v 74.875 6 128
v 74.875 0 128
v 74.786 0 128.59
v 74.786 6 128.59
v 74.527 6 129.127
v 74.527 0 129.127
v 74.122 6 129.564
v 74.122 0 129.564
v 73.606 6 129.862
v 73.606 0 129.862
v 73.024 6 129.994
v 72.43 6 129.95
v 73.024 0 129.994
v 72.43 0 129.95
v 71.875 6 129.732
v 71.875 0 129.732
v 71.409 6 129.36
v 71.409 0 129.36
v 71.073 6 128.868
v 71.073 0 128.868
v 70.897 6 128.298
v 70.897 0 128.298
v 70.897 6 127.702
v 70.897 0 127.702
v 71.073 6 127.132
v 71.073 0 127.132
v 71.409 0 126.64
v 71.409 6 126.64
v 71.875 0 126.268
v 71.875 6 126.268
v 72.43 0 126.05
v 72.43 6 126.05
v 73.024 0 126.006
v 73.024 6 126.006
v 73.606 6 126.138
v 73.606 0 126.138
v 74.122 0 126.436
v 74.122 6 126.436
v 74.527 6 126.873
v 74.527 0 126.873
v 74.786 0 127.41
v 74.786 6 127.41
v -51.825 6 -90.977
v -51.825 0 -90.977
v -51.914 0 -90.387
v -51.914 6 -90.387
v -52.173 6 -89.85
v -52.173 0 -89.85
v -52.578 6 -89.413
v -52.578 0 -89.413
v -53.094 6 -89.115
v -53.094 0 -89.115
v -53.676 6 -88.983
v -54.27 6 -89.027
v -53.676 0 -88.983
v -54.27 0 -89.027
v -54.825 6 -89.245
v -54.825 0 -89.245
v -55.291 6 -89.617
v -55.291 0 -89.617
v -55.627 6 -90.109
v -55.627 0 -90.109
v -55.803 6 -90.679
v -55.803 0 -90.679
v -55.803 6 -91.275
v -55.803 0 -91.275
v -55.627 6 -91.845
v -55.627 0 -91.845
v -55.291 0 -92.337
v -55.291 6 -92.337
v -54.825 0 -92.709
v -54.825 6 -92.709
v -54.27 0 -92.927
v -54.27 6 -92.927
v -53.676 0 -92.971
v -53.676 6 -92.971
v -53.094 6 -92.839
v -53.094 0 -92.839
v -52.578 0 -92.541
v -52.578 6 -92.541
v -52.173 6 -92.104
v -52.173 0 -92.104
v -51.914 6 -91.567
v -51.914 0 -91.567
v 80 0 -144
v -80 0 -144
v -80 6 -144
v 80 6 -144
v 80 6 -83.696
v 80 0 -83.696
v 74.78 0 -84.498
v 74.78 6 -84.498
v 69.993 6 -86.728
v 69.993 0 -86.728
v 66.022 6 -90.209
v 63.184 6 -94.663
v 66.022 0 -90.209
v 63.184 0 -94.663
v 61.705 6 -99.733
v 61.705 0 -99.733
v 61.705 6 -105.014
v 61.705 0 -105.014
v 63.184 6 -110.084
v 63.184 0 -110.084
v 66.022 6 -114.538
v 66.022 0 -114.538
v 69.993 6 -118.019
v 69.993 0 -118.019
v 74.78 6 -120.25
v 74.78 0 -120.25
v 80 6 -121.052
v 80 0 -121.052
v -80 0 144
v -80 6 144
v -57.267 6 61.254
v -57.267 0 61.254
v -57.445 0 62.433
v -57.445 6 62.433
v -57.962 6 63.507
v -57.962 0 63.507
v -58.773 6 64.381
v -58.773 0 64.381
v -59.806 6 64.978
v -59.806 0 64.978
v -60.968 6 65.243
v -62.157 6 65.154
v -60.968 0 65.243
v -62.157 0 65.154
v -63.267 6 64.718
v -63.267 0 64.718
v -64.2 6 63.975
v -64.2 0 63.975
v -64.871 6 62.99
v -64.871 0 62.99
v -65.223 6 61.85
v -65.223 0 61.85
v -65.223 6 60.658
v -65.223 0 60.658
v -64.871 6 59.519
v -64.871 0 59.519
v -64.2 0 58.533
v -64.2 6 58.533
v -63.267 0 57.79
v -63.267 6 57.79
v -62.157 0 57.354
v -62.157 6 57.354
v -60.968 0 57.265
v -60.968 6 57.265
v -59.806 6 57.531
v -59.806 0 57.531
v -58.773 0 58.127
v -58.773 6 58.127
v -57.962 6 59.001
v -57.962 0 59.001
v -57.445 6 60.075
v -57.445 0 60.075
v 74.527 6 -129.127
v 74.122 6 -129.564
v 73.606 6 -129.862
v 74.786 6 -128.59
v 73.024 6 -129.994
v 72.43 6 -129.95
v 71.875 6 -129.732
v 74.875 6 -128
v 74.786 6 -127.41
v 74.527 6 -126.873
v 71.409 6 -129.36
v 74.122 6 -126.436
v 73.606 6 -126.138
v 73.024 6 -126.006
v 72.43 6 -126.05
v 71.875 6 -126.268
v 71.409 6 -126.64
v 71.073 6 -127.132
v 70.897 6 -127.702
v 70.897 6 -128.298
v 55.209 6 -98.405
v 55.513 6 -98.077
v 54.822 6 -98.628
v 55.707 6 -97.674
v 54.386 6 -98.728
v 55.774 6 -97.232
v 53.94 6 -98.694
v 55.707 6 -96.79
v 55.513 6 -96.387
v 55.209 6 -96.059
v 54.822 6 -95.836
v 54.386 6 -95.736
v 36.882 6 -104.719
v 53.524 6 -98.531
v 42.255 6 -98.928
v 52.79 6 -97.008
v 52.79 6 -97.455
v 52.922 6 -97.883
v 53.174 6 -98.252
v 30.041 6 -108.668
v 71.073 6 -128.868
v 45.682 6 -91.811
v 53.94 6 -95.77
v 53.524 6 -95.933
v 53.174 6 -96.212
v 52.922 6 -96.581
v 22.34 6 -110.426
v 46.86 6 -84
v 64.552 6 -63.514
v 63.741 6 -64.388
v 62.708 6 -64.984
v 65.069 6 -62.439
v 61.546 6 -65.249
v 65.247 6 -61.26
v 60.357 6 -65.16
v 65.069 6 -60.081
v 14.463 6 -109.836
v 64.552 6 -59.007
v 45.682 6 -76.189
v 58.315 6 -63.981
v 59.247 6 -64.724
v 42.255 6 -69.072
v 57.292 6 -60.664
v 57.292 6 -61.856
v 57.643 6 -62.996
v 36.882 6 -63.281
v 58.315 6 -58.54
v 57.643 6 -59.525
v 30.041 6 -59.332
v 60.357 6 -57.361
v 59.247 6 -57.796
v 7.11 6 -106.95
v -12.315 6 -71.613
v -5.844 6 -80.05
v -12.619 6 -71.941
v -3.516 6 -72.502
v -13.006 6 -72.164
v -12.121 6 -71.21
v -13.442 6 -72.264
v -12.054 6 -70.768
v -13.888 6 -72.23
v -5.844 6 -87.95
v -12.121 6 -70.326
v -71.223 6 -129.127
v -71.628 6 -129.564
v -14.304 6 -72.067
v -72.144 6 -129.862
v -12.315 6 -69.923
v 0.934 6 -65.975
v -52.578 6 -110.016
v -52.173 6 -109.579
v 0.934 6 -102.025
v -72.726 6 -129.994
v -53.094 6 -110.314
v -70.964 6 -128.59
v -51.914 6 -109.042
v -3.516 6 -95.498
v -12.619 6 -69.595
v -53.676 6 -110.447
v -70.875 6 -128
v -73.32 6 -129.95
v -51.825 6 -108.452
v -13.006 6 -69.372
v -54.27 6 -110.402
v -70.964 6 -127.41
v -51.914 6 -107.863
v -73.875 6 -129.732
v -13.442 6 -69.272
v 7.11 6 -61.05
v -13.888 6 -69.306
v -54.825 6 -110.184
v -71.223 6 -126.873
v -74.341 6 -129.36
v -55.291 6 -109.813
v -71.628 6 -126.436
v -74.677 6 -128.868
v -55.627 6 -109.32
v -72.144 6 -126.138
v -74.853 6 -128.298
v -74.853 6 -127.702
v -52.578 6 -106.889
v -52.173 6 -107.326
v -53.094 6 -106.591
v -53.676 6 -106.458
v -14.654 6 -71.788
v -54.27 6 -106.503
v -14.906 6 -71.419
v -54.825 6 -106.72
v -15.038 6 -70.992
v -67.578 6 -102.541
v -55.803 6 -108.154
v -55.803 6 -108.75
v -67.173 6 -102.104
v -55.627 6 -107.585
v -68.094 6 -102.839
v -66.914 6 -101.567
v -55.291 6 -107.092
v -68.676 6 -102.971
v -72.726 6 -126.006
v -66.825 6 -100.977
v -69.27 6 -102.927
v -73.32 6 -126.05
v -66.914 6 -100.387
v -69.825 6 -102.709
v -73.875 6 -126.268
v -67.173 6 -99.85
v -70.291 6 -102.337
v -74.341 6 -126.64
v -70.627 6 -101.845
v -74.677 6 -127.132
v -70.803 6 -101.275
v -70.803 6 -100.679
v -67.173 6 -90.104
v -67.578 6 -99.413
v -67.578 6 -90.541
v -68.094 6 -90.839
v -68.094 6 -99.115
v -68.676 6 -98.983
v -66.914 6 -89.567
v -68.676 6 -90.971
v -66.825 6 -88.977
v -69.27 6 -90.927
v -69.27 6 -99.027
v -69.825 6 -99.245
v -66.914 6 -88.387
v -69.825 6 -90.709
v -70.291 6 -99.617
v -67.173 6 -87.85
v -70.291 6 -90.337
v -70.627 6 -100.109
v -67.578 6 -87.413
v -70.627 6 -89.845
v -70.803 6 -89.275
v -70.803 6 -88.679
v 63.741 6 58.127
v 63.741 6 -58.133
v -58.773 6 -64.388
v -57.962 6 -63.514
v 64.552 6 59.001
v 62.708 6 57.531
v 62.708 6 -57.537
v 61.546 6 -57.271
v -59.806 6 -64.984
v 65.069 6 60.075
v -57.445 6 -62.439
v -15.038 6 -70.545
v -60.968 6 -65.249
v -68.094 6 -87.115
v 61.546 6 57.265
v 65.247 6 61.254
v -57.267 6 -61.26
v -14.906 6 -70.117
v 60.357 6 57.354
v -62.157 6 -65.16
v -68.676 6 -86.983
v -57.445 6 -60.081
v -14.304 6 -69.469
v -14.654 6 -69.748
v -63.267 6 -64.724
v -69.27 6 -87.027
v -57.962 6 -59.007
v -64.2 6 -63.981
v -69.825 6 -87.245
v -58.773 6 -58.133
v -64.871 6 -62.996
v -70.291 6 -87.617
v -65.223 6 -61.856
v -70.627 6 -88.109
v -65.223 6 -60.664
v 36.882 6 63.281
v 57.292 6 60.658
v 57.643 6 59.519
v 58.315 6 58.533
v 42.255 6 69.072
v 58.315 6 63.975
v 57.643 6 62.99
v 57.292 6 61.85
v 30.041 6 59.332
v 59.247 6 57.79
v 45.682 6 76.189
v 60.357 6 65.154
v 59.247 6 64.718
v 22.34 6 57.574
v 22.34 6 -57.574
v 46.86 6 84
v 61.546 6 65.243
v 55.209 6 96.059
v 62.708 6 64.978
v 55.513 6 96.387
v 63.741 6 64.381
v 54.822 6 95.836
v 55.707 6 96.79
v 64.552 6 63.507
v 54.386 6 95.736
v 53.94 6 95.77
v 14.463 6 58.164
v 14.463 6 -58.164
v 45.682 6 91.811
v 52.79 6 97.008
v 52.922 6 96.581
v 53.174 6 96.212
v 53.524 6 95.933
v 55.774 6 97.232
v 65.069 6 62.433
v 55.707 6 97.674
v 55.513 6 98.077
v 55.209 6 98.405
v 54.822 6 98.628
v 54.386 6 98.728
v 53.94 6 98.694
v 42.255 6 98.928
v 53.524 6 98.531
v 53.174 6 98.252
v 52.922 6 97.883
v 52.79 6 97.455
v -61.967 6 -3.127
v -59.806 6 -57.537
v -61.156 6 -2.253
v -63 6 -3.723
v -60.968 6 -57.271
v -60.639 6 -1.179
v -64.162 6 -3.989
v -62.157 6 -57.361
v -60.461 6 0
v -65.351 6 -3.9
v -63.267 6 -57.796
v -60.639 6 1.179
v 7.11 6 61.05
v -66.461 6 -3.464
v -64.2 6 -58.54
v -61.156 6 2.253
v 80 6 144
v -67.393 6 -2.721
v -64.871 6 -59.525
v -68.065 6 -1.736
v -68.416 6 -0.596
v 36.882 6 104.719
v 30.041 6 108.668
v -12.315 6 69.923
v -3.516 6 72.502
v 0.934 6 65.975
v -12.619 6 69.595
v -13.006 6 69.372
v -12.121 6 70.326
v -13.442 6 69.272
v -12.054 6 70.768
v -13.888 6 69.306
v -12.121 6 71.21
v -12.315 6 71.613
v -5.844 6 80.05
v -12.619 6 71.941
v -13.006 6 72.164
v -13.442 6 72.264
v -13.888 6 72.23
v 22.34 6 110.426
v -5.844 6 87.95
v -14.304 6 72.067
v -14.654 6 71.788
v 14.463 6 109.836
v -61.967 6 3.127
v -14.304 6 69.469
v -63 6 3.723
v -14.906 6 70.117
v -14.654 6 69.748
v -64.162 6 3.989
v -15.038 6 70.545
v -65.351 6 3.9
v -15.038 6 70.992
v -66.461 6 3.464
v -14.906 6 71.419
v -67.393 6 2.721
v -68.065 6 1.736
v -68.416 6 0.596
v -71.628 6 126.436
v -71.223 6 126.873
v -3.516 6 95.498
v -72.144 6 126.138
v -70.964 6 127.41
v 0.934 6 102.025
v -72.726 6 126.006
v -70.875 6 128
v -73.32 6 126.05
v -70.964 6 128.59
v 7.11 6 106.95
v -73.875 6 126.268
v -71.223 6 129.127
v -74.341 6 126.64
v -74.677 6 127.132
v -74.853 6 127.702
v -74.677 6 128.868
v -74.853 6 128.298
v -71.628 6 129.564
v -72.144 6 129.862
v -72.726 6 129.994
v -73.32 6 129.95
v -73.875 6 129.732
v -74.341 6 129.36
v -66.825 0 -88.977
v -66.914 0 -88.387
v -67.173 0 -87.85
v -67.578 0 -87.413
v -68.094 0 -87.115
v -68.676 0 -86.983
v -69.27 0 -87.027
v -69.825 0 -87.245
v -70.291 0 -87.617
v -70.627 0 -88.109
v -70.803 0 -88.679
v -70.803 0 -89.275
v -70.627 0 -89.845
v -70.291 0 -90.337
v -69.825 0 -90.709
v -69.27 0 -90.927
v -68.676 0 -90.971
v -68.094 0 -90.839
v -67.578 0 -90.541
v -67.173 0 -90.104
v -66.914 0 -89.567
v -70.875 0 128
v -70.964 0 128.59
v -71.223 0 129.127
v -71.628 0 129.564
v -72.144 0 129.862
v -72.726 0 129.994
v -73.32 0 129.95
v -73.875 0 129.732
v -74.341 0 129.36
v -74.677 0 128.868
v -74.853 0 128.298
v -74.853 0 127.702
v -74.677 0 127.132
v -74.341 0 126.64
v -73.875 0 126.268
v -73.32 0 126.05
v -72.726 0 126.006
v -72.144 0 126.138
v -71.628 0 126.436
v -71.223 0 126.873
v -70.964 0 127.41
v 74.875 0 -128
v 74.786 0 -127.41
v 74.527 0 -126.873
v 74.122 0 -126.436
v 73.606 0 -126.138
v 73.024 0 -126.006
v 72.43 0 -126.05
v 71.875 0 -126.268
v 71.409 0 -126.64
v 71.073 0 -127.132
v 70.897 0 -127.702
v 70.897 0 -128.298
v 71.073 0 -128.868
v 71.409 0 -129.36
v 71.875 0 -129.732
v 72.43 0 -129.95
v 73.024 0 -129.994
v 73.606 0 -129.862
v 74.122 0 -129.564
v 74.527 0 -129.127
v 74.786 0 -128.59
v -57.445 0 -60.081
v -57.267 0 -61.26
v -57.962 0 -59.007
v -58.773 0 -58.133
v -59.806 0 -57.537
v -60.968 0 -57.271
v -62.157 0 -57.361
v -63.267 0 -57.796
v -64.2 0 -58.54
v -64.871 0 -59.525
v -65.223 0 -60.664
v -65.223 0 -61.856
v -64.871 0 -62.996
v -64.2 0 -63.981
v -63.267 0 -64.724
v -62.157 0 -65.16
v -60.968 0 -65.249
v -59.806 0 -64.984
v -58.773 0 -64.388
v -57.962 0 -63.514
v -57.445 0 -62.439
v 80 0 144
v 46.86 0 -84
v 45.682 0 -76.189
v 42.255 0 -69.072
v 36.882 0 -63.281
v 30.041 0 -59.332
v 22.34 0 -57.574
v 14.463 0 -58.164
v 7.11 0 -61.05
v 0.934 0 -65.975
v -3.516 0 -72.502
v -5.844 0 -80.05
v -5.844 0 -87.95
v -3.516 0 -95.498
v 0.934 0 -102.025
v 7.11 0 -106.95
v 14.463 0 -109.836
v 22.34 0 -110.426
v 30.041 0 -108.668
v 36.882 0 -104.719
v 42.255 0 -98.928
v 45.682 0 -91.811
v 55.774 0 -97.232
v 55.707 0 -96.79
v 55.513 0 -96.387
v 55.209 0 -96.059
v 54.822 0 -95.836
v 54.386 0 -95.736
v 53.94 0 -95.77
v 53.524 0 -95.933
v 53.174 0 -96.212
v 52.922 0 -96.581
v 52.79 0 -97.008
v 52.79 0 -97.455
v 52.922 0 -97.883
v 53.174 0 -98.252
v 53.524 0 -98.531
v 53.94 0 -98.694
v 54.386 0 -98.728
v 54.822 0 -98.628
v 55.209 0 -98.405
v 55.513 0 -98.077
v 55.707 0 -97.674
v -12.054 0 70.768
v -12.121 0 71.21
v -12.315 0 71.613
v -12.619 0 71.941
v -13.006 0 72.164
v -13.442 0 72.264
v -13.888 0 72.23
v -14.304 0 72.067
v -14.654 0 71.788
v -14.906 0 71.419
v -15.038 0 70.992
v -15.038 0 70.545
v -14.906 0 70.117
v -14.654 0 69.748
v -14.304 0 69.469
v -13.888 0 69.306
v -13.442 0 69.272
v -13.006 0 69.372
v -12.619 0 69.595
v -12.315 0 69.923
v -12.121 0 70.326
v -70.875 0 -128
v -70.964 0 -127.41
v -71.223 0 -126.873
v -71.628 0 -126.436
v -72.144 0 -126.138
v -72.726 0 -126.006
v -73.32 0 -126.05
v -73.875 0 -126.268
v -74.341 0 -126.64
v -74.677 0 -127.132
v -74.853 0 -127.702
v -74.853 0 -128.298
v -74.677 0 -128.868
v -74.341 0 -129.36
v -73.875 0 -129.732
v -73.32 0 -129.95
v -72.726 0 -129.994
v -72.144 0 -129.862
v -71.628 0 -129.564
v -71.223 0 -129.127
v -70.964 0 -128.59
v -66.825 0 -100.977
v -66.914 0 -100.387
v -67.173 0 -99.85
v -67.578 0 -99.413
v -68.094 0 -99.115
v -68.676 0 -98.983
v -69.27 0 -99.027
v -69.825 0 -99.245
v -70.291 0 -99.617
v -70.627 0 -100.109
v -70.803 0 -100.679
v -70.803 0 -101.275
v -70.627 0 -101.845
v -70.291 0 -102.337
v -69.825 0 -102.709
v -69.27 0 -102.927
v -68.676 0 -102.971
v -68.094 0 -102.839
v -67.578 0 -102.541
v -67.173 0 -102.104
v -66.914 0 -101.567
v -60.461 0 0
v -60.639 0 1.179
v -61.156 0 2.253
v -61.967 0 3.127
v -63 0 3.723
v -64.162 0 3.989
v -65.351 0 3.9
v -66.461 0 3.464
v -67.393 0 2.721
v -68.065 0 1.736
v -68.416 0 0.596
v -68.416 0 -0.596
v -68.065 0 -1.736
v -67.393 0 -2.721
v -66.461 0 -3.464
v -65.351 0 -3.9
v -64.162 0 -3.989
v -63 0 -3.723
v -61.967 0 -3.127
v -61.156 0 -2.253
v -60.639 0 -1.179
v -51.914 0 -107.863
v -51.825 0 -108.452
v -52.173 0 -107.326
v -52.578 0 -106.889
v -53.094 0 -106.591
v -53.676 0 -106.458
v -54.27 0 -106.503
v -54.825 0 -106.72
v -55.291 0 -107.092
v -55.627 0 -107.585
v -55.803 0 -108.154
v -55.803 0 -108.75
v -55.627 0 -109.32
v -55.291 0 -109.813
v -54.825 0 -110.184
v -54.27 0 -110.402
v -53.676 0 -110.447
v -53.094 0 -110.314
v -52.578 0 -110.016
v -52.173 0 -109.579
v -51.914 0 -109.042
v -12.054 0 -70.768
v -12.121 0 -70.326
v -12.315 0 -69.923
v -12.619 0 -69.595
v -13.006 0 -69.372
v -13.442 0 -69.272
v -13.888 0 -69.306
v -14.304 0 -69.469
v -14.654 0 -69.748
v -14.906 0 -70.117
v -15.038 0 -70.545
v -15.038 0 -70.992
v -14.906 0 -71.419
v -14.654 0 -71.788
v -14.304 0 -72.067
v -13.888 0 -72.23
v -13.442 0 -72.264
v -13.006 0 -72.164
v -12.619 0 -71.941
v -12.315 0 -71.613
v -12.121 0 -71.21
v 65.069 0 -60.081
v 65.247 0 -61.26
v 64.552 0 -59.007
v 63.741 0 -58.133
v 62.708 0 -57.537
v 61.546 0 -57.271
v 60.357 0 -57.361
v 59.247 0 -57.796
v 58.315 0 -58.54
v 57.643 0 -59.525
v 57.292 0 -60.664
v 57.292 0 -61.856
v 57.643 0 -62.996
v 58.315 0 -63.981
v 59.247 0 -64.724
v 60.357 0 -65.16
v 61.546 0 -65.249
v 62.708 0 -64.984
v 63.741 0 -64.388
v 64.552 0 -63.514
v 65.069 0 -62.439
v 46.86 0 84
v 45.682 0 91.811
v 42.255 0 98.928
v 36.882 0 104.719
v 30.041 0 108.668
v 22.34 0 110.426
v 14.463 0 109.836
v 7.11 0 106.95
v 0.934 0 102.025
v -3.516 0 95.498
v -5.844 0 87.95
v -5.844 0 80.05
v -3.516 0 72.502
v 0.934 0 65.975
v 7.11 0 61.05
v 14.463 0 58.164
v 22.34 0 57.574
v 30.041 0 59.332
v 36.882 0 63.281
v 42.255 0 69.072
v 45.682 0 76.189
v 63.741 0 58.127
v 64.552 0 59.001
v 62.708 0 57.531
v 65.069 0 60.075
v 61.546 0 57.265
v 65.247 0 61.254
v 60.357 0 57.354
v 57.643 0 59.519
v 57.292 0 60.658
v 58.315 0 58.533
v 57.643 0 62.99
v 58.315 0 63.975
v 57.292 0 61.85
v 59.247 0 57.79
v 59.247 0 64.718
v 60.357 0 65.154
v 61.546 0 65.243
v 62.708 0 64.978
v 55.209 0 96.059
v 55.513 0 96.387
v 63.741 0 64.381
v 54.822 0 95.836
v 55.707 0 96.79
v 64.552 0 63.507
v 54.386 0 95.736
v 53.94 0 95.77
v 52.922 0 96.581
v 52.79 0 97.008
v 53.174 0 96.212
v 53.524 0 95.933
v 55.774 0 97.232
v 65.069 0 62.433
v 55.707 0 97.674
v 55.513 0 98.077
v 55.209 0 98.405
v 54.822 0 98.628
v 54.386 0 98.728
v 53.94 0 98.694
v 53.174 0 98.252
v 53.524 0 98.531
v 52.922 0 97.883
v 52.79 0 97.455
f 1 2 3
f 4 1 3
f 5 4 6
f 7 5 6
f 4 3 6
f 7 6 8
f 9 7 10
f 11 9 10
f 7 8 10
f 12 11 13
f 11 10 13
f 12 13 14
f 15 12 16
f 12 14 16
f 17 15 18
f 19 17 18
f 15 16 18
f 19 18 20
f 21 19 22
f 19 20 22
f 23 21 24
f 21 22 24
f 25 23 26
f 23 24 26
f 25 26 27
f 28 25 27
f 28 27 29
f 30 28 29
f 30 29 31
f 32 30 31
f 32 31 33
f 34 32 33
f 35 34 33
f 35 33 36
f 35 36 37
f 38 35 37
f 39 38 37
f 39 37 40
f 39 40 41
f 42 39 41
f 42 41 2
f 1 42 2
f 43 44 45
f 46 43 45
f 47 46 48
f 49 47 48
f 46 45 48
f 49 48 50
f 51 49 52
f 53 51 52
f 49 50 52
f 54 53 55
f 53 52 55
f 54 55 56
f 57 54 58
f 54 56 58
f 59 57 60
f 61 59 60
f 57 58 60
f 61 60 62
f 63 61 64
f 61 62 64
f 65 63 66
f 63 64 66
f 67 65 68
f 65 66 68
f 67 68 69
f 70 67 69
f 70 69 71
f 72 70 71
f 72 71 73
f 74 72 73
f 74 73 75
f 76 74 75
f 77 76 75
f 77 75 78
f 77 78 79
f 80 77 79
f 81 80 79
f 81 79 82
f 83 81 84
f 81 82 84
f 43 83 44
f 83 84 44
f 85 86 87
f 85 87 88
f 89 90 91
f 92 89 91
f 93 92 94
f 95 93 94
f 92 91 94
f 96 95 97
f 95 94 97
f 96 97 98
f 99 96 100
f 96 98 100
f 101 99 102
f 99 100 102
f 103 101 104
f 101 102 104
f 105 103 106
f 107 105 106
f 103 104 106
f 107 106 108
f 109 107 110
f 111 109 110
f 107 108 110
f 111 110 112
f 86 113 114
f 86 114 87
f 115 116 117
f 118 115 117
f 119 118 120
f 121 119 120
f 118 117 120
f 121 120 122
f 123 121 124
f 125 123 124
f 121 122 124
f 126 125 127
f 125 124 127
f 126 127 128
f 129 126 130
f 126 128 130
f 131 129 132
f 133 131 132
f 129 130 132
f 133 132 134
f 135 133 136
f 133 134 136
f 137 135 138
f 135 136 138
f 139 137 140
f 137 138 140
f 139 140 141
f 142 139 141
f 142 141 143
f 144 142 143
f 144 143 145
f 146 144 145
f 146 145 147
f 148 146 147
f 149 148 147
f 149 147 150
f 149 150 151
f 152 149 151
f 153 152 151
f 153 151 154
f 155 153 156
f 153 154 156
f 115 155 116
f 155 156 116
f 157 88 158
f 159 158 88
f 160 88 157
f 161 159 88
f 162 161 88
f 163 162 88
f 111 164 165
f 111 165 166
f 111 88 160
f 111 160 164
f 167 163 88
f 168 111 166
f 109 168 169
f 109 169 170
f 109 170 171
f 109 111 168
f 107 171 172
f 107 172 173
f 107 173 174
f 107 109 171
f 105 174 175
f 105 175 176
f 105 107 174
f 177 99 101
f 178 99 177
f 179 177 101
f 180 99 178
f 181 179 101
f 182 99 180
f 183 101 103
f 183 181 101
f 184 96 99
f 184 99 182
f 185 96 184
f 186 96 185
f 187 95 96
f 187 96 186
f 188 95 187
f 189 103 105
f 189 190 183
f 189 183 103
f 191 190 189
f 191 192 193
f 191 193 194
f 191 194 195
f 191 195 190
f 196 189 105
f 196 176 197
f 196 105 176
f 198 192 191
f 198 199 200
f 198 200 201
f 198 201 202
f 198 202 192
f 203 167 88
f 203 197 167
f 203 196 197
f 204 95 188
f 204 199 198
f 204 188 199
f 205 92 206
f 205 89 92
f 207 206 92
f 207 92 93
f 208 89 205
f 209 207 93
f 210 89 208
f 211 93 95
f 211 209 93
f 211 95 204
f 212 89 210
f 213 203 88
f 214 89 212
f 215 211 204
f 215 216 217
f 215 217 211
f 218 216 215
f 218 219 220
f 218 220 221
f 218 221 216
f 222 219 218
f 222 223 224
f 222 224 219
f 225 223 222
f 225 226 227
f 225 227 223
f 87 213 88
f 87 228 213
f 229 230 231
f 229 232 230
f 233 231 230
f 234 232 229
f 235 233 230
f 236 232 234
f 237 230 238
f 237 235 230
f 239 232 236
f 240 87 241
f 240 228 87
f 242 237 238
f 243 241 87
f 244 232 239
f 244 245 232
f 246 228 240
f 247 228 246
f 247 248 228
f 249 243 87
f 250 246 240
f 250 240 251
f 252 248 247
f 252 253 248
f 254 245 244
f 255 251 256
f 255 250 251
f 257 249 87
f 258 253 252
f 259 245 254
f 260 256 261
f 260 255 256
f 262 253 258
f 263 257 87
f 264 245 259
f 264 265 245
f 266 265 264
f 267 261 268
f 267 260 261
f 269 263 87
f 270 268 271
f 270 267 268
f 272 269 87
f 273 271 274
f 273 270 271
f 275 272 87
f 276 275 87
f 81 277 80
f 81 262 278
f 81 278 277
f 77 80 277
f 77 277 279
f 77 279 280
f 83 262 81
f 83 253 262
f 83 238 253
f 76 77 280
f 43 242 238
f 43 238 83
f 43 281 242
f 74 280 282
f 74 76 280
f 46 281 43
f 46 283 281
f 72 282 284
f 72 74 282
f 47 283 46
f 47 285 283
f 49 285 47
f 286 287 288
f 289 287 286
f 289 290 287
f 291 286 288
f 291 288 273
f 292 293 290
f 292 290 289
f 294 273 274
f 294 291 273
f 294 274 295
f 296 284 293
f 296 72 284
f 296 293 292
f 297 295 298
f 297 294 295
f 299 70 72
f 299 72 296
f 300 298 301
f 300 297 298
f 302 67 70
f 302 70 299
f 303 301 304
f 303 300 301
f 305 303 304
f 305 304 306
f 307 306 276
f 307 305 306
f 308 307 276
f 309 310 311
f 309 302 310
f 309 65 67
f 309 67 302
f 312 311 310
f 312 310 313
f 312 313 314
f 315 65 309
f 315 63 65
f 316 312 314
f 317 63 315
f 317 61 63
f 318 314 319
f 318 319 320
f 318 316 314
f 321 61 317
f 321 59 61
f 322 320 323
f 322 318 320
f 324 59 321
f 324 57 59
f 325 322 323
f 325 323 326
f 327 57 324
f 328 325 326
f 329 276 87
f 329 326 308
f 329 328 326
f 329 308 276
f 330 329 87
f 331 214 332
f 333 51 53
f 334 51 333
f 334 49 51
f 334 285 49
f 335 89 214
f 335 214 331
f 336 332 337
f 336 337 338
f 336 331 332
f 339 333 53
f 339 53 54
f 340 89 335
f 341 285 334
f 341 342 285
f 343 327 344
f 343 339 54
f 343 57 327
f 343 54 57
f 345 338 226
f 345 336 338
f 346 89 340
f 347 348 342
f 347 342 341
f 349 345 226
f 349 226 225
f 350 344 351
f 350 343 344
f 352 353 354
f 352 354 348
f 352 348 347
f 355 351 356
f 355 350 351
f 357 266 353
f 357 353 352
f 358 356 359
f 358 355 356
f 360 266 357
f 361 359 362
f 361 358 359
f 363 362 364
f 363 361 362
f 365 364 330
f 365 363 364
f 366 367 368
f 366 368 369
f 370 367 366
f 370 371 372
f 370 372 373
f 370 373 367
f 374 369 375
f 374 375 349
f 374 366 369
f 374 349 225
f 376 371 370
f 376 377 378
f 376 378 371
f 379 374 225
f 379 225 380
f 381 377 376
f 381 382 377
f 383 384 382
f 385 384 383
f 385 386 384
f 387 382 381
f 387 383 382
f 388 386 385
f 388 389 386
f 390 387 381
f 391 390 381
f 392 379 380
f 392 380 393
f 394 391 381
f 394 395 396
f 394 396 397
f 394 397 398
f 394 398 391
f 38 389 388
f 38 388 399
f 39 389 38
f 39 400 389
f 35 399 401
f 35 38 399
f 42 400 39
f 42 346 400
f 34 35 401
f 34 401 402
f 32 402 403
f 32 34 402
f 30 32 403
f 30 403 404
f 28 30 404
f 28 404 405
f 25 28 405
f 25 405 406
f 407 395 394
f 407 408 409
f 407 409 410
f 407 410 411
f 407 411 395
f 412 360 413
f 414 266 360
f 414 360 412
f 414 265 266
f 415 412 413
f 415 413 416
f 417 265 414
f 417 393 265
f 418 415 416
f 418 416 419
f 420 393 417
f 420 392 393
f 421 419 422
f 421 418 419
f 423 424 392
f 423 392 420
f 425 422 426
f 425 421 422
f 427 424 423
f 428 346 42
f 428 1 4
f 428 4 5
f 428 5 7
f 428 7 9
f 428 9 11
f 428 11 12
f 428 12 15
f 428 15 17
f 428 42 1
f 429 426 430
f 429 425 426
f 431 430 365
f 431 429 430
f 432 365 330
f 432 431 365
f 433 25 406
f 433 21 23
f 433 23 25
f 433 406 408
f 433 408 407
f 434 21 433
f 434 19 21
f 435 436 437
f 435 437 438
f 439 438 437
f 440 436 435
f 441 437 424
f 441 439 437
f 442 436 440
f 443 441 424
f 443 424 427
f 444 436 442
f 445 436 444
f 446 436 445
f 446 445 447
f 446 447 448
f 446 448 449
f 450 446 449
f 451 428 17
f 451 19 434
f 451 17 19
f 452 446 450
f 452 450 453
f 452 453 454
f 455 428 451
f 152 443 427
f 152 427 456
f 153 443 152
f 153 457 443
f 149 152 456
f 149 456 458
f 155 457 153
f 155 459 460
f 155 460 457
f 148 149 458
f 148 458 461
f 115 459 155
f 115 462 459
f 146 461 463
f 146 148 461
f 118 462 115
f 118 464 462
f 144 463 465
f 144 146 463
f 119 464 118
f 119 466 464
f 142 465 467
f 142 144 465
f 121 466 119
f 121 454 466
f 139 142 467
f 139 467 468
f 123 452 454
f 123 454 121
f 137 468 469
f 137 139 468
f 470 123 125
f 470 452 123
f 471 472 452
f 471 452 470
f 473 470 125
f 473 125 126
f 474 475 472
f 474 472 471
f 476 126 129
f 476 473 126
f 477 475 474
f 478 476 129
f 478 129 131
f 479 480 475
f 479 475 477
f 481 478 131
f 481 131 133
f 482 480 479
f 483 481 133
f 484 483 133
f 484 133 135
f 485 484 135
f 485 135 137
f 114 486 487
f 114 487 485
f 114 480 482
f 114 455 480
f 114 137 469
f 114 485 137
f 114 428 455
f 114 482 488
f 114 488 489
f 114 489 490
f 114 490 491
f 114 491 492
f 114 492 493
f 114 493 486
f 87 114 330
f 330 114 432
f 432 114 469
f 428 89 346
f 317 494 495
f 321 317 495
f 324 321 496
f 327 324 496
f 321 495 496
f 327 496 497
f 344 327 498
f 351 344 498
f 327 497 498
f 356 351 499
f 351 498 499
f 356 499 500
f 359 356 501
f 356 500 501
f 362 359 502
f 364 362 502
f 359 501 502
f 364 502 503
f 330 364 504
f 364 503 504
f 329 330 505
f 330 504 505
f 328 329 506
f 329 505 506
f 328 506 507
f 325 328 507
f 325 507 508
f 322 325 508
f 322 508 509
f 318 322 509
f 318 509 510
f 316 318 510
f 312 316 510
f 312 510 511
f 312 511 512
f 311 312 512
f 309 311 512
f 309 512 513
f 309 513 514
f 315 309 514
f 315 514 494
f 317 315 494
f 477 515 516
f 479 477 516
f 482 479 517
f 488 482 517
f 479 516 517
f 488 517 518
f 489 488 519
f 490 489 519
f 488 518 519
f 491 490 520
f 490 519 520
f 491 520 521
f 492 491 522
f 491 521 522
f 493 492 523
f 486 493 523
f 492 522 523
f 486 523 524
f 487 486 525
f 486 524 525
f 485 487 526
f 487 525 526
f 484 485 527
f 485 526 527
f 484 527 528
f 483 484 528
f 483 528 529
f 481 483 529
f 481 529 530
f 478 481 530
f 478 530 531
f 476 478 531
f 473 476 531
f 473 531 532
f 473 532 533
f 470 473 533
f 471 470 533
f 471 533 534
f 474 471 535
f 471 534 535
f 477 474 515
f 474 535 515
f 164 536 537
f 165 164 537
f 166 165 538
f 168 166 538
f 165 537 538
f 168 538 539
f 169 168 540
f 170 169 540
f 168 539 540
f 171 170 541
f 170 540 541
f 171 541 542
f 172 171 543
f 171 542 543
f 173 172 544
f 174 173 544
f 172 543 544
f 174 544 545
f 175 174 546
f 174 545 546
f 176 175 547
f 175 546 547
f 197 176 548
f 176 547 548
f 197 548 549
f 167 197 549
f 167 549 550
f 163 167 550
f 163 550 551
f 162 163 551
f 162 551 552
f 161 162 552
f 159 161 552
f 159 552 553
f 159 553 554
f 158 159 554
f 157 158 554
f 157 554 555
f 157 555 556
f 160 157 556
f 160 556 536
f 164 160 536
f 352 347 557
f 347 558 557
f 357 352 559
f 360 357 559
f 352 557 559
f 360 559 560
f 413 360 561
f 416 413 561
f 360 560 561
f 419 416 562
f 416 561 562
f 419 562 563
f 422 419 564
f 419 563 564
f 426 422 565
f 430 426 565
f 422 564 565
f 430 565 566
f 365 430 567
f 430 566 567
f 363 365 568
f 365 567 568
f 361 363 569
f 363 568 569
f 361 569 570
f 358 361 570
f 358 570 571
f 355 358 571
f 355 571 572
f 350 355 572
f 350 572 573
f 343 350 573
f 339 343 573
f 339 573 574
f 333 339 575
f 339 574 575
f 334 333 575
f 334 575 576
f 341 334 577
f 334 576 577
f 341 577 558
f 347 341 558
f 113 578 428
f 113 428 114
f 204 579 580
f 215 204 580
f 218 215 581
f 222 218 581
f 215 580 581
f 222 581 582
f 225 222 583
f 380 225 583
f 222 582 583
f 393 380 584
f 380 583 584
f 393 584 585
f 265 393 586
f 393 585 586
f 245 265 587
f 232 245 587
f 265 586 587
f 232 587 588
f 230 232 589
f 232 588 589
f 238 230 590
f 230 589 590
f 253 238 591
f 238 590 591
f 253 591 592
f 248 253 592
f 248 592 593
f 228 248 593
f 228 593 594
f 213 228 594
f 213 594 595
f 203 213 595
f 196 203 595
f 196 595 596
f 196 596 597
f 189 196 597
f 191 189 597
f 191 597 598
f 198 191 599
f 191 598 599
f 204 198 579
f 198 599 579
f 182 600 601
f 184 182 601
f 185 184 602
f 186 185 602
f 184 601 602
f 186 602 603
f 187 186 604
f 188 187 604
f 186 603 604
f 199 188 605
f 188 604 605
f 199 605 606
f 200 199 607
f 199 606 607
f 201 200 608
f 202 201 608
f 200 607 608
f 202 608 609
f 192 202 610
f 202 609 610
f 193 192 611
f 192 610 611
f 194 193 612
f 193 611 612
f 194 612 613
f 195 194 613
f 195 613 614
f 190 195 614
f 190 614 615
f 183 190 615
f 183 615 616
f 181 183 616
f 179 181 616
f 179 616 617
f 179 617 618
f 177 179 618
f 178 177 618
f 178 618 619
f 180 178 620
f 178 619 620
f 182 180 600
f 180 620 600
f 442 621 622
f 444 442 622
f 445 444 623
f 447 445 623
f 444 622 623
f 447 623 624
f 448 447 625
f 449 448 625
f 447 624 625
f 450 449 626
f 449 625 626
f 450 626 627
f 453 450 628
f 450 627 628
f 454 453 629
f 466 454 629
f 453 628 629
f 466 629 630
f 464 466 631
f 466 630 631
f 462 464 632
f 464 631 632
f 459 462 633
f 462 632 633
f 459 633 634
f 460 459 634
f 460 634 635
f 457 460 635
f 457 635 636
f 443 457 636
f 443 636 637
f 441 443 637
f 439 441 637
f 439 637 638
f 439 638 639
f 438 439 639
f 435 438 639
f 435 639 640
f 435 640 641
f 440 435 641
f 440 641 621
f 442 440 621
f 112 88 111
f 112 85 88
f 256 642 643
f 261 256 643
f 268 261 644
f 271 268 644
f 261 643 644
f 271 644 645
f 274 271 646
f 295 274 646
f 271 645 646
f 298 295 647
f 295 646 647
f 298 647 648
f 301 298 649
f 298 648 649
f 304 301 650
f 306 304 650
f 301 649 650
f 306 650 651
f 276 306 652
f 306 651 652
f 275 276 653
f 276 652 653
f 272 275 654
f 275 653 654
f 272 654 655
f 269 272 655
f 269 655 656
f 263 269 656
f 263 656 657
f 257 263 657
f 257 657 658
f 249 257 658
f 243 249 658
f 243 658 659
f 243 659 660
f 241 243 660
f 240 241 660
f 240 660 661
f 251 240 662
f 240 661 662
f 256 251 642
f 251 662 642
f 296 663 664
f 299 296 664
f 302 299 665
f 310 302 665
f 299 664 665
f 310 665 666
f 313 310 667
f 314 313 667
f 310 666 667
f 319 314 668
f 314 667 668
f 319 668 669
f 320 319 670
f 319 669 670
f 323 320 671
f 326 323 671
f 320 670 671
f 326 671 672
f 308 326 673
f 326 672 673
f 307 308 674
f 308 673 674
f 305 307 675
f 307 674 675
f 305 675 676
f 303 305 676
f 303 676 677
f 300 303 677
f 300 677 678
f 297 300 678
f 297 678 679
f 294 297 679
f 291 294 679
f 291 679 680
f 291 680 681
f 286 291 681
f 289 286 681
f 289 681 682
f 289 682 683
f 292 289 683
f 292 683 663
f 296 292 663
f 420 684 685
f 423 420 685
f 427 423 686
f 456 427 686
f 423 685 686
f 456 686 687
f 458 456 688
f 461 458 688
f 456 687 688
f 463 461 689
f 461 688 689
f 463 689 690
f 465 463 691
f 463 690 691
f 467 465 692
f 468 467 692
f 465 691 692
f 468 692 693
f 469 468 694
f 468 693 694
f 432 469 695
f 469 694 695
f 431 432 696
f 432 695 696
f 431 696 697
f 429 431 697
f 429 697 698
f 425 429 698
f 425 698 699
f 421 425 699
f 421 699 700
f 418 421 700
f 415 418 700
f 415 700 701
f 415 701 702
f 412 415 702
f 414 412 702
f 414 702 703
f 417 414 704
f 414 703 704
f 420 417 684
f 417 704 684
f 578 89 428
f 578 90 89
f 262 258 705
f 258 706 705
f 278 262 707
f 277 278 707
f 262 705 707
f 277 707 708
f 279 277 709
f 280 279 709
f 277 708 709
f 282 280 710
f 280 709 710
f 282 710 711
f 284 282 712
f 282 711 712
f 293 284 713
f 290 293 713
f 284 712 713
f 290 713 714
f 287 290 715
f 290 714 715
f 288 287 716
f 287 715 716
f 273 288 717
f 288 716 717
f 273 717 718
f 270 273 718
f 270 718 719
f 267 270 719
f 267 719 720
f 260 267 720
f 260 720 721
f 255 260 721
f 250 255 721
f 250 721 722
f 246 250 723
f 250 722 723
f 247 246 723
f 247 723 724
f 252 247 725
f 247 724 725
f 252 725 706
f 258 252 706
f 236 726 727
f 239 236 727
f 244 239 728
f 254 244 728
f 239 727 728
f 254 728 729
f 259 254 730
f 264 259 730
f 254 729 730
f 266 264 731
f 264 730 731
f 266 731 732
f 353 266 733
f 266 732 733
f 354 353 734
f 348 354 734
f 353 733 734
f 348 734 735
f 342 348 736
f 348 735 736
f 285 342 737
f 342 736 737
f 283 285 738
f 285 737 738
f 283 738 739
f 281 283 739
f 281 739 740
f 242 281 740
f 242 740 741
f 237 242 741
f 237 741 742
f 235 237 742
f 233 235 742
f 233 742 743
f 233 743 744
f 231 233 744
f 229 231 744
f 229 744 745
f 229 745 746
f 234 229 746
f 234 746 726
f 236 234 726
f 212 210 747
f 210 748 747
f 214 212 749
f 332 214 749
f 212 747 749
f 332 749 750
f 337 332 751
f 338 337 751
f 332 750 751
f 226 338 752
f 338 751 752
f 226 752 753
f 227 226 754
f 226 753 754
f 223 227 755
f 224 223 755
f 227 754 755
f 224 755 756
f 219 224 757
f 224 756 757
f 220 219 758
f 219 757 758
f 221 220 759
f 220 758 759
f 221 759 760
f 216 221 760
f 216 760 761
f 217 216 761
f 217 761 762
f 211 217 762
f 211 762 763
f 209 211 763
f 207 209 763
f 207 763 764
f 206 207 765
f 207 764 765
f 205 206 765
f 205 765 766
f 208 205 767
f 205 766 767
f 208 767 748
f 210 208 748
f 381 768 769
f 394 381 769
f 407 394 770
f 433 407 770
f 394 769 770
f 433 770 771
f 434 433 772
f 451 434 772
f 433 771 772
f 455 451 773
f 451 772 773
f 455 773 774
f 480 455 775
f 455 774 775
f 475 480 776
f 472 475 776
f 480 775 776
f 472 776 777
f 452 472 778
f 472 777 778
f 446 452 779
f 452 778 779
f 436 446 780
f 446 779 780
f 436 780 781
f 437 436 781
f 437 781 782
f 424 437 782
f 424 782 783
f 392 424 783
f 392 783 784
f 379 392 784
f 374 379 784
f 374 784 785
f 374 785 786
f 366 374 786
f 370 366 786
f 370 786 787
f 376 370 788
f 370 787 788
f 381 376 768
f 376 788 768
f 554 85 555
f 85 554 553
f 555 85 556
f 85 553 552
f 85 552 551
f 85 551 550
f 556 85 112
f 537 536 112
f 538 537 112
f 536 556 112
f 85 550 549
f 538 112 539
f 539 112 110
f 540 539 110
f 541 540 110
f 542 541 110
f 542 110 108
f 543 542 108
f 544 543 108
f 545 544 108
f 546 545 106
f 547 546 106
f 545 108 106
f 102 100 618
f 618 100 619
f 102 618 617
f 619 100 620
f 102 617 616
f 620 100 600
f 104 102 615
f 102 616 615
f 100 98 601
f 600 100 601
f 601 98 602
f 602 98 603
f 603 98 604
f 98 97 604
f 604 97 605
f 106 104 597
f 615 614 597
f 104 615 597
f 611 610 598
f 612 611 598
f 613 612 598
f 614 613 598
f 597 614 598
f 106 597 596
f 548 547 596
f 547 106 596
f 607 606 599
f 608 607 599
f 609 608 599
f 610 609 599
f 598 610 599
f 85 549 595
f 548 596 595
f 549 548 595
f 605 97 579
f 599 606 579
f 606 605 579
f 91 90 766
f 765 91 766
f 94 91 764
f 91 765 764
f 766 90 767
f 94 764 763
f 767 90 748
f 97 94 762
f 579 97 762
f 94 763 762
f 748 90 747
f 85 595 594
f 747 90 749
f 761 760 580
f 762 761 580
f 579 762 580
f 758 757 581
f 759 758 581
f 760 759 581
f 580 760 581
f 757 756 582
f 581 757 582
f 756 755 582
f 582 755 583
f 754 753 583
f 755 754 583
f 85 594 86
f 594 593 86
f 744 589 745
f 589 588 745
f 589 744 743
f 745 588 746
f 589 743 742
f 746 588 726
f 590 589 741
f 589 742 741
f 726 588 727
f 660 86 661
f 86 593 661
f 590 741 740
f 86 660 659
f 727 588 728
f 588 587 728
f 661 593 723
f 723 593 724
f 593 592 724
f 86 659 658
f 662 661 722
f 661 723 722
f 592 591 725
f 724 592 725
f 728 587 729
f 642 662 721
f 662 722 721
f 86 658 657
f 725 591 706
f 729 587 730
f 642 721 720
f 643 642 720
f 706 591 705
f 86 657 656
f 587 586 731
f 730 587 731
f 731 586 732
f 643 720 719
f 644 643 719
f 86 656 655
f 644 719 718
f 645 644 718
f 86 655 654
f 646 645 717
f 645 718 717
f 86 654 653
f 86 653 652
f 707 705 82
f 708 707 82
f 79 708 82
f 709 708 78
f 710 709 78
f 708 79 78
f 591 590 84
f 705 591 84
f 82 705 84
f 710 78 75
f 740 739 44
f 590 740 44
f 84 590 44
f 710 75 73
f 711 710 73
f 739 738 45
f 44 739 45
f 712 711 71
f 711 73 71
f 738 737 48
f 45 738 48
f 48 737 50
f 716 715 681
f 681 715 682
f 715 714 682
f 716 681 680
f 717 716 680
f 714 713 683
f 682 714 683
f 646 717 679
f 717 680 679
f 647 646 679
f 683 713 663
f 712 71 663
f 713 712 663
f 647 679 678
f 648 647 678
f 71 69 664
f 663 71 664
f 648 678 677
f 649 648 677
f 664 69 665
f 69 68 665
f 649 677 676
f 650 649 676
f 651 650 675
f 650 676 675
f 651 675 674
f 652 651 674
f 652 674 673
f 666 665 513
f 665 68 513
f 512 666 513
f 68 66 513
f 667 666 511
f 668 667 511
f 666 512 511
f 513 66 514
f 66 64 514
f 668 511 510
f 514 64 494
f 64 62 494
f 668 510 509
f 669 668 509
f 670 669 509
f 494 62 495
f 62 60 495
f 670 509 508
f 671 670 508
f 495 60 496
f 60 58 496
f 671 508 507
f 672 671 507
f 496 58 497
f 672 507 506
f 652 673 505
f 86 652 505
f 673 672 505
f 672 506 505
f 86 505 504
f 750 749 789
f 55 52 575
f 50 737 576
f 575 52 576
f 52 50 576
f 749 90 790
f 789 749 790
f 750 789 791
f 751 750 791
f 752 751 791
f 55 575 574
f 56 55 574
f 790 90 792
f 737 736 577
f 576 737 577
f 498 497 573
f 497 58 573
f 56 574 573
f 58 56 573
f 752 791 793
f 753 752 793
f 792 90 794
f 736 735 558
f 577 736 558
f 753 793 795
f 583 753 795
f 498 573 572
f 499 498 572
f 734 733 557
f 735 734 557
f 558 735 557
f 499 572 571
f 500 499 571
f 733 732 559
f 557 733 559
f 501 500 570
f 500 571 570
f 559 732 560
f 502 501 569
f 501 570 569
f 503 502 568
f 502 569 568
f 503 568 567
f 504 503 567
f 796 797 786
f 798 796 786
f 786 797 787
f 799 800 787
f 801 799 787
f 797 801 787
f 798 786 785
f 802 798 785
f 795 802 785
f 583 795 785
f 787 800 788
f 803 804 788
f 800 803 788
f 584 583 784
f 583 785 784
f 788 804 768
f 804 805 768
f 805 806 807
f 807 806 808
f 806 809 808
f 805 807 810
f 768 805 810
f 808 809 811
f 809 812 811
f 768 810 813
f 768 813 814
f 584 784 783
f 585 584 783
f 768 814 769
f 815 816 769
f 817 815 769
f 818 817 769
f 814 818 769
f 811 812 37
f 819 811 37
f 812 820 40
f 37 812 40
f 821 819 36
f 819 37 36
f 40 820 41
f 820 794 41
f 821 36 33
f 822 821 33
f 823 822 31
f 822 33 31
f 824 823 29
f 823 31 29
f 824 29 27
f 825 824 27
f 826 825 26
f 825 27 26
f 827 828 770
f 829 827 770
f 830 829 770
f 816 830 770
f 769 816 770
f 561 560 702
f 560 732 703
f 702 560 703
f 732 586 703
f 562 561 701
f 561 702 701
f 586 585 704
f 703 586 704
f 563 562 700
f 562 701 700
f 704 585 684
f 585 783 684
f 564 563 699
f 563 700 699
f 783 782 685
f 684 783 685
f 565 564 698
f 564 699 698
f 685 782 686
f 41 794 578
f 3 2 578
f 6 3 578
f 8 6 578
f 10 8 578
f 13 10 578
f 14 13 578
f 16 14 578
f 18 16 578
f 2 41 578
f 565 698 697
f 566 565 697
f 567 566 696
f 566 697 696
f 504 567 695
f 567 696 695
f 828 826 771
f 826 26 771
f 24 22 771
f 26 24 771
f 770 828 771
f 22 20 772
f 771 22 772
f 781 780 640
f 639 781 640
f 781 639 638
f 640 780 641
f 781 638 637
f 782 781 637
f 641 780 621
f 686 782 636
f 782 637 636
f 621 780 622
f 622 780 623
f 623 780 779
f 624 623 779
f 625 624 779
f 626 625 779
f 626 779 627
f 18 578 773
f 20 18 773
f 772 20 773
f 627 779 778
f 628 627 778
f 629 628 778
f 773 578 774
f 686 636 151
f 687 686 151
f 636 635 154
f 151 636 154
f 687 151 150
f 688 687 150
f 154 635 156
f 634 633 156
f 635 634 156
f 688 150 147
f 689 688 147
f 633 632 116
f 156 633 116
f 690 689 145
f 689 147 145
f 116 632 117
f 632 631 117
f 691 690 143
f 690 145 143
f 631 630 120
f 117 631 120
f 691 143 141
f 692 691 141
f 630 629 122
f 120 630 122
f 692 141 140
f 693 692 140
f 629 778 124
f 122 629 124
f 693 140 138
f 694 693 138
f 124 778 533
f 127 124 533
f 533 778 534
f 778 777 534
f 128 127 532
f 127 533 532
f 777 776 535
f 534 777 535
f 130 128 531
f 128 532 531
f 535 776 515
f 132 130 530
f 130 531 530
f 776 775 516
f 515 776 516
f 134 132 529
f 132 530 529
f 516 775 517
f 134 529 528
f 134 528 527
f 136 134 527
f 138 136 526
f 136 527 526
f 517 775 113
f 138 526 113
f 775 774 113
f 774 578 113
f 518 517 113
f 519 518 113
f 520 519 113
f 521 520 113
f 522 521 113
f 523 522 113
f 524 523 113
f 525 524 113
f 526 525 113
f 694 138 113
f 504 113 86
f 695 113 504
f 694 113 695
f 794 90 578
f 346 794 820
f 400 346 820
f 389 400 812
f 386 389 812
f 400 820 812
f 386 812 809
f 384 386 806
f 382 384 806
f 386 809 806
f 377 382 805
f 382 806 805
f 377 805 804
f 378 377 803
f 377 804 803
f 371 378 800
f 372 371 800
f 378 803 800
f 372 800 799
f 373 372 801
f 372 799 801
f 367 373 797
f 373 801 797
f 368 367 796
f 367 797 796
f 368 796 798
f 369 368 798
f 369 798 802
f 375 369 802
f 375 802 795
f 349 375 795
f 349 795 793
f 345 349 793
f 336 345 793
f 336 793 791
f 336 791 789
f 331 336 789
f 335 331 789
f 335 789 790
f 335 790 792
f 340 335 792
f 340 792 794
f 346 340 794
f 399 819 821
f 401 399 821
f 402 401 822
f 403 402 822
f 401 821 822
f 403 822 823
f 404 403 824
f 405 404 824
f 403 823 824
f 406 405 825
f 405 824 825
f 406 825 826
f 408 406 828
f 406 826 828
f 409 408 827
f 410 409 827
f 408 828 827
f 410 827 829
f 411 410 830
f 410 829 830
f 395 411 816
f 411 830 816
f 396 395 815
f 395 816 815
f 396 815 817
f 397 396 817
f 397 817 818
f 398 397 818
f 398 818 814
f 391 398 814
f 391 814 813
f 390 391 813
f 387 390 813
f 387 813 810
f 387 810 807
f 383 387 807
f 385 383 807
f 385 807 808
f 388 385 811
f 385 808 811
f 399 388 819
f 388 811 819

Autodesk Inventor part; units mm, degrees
ref_plane "YZ Plane" through (0, 0, 0) normal (1, 0, 0) x (0, 1, 0)
ref_plane "XZ Plane" through (0, 0, 0) normal (0, 1, 0) x (-1, 0, 0)
ref_plane "XY Plane" through (0, 0, 0) normal (0, 0, 1) x (1, 0, 0)
sketch "Эскиз1" plane through (0, 0, 0) normal (0, 1, 0) x (-1, 0, 0)
  line L0 (-80, 144) -> (80, 144)
  line L1 (80, 144) -> (80, -144)
  line L2 (80, -144) -> (-80, -144)
  line L3 (-80, -144) -> (-80, 144)
  line L4 (-80, 144) -> (80, -144) construction
  line L5 (80, 144) -> (-80, -144) construction
  point P0 (0, 0)
  dimension "d0" = 160
  dimension "d1" = 288
extrude "Выдавливание1" add sketch "Эскиз1" along normal blind 6
sketch "Эскиз4" plane through (0, 6, 0) normal (0, 1, 0) x (1, 0, 0)
  circle A0 centre (63.6396, 63.6396) radius 4
  line L0 (0, 0) -> (31.2937, 0) construction
  line L1 (63.6396, 63.6396) -> (0, 0) construction
  dimension "d8" = 8
  dimension "d9" = 90
  dimension "d10" = 45
extrude "Выдавливание4" [suppressed]
pattern_circular "Круговой массив1" [suppressed]
sketch "Эскиз6" plane through (0, 0, 0) normal (0, -1, 0) x (1, 0, 0)
  circle A0 centre (-61.2673, 61.2541) radius 4 projected
  circle A1 centre (-61.2673, -61.2603) radius 4 projected
  circle A2 centre (61.2471, -61.2603) radius 4 projected
  circle A3 centre (61.2471, 61.2541) radius 4 projected
  circle A4 centre (20.3596, -84) radius 26.5 projected
  circle A5 centre (20.3596, 84) radius 26.5 projected
  point P0 (0, 0)
extrude "Выдавливание5" cut sketch "Эскиз6" against normal blind 10
sketch "Эскиз7" plane through (0, 0, 0) normal (0, -1, 0) x (1, 0, 0)
  circle A0 centre (-13.5545, -70.7681) radius 1.5 projected
  circle A1 centre (54.2737, -97.2319) radius 1.5 projected
  circle A2 centre (54.2737, 97.2319) radius 1.5 projected
  circle A3 centre (-13.5545, 70.7681) radius 1.5 projected
  point P0 (0, 0)
extrude "Выдавливание6" cut sketch "Эскиз7" against normal blind 10
sketch "Эскиз8" plane through (0, 0, 0) normal (0, -1, 0) x (1, 0, 0)
  circle A0 centre (-68.825, -100.977) radius 2 projected
  circle A1 centre (-68.825, -88.977) radius 2 projected
  circle A2 centre (-53.825, -90.977) radius 2 projected
  circle A3 centre (-53.825, -108.4524) radius 2 projected
  point P0 (0, 0)
extrude "Выдавливание7" cut sketch "Эскиз8" against normal blind 10
sketch "Эскиз9" plane through (0, 0, 0) normal (0, -1, 0) x (1, 0, 0)
  circle A0 centre (72.875, -128) radius 2 projected
  circle A1 centre (-72.875, -128) radius 2 projected
  circle A2 centre (-72.875, 128) radius 2 projected
  circle A3 centre (72.875, 128) radius 2 projected
  point P0 (0, 0)
sketch "Эскиз10" plane through (0, 0, 0) normal (0, -1, 0) x (1, 0, 0)
  arc A0 (80, -83.696) -> (80, -121.0515) centre (80.1966, -102.3738) ccw
  line L0 (80, 144) -> (80, -144) projected
  point P0 (0, 0)
extrude "Выдавливание8" cut sketch "Эскиз10" against normal blind 10
sketch "Эскиз11" plane through (0, 0, 0) normal (0, -1, 0) x (1, 0, 0)
  circle A0 centre (-64.4611, 0) radius 4
  line L0 (-80, -144) -> (-80, 144) projected
  point P0 (0, 0)
  point P1 (-80, 0)
  dimension "d24" = 8
extrude "Выдавливание9" cut sketch "Эскиз11" against normal through all
extrude "Выдавливание10" cut sketch "Эскиз9" against normal through all
properties part number "000.001.006 - Площадка под манипулятор"
